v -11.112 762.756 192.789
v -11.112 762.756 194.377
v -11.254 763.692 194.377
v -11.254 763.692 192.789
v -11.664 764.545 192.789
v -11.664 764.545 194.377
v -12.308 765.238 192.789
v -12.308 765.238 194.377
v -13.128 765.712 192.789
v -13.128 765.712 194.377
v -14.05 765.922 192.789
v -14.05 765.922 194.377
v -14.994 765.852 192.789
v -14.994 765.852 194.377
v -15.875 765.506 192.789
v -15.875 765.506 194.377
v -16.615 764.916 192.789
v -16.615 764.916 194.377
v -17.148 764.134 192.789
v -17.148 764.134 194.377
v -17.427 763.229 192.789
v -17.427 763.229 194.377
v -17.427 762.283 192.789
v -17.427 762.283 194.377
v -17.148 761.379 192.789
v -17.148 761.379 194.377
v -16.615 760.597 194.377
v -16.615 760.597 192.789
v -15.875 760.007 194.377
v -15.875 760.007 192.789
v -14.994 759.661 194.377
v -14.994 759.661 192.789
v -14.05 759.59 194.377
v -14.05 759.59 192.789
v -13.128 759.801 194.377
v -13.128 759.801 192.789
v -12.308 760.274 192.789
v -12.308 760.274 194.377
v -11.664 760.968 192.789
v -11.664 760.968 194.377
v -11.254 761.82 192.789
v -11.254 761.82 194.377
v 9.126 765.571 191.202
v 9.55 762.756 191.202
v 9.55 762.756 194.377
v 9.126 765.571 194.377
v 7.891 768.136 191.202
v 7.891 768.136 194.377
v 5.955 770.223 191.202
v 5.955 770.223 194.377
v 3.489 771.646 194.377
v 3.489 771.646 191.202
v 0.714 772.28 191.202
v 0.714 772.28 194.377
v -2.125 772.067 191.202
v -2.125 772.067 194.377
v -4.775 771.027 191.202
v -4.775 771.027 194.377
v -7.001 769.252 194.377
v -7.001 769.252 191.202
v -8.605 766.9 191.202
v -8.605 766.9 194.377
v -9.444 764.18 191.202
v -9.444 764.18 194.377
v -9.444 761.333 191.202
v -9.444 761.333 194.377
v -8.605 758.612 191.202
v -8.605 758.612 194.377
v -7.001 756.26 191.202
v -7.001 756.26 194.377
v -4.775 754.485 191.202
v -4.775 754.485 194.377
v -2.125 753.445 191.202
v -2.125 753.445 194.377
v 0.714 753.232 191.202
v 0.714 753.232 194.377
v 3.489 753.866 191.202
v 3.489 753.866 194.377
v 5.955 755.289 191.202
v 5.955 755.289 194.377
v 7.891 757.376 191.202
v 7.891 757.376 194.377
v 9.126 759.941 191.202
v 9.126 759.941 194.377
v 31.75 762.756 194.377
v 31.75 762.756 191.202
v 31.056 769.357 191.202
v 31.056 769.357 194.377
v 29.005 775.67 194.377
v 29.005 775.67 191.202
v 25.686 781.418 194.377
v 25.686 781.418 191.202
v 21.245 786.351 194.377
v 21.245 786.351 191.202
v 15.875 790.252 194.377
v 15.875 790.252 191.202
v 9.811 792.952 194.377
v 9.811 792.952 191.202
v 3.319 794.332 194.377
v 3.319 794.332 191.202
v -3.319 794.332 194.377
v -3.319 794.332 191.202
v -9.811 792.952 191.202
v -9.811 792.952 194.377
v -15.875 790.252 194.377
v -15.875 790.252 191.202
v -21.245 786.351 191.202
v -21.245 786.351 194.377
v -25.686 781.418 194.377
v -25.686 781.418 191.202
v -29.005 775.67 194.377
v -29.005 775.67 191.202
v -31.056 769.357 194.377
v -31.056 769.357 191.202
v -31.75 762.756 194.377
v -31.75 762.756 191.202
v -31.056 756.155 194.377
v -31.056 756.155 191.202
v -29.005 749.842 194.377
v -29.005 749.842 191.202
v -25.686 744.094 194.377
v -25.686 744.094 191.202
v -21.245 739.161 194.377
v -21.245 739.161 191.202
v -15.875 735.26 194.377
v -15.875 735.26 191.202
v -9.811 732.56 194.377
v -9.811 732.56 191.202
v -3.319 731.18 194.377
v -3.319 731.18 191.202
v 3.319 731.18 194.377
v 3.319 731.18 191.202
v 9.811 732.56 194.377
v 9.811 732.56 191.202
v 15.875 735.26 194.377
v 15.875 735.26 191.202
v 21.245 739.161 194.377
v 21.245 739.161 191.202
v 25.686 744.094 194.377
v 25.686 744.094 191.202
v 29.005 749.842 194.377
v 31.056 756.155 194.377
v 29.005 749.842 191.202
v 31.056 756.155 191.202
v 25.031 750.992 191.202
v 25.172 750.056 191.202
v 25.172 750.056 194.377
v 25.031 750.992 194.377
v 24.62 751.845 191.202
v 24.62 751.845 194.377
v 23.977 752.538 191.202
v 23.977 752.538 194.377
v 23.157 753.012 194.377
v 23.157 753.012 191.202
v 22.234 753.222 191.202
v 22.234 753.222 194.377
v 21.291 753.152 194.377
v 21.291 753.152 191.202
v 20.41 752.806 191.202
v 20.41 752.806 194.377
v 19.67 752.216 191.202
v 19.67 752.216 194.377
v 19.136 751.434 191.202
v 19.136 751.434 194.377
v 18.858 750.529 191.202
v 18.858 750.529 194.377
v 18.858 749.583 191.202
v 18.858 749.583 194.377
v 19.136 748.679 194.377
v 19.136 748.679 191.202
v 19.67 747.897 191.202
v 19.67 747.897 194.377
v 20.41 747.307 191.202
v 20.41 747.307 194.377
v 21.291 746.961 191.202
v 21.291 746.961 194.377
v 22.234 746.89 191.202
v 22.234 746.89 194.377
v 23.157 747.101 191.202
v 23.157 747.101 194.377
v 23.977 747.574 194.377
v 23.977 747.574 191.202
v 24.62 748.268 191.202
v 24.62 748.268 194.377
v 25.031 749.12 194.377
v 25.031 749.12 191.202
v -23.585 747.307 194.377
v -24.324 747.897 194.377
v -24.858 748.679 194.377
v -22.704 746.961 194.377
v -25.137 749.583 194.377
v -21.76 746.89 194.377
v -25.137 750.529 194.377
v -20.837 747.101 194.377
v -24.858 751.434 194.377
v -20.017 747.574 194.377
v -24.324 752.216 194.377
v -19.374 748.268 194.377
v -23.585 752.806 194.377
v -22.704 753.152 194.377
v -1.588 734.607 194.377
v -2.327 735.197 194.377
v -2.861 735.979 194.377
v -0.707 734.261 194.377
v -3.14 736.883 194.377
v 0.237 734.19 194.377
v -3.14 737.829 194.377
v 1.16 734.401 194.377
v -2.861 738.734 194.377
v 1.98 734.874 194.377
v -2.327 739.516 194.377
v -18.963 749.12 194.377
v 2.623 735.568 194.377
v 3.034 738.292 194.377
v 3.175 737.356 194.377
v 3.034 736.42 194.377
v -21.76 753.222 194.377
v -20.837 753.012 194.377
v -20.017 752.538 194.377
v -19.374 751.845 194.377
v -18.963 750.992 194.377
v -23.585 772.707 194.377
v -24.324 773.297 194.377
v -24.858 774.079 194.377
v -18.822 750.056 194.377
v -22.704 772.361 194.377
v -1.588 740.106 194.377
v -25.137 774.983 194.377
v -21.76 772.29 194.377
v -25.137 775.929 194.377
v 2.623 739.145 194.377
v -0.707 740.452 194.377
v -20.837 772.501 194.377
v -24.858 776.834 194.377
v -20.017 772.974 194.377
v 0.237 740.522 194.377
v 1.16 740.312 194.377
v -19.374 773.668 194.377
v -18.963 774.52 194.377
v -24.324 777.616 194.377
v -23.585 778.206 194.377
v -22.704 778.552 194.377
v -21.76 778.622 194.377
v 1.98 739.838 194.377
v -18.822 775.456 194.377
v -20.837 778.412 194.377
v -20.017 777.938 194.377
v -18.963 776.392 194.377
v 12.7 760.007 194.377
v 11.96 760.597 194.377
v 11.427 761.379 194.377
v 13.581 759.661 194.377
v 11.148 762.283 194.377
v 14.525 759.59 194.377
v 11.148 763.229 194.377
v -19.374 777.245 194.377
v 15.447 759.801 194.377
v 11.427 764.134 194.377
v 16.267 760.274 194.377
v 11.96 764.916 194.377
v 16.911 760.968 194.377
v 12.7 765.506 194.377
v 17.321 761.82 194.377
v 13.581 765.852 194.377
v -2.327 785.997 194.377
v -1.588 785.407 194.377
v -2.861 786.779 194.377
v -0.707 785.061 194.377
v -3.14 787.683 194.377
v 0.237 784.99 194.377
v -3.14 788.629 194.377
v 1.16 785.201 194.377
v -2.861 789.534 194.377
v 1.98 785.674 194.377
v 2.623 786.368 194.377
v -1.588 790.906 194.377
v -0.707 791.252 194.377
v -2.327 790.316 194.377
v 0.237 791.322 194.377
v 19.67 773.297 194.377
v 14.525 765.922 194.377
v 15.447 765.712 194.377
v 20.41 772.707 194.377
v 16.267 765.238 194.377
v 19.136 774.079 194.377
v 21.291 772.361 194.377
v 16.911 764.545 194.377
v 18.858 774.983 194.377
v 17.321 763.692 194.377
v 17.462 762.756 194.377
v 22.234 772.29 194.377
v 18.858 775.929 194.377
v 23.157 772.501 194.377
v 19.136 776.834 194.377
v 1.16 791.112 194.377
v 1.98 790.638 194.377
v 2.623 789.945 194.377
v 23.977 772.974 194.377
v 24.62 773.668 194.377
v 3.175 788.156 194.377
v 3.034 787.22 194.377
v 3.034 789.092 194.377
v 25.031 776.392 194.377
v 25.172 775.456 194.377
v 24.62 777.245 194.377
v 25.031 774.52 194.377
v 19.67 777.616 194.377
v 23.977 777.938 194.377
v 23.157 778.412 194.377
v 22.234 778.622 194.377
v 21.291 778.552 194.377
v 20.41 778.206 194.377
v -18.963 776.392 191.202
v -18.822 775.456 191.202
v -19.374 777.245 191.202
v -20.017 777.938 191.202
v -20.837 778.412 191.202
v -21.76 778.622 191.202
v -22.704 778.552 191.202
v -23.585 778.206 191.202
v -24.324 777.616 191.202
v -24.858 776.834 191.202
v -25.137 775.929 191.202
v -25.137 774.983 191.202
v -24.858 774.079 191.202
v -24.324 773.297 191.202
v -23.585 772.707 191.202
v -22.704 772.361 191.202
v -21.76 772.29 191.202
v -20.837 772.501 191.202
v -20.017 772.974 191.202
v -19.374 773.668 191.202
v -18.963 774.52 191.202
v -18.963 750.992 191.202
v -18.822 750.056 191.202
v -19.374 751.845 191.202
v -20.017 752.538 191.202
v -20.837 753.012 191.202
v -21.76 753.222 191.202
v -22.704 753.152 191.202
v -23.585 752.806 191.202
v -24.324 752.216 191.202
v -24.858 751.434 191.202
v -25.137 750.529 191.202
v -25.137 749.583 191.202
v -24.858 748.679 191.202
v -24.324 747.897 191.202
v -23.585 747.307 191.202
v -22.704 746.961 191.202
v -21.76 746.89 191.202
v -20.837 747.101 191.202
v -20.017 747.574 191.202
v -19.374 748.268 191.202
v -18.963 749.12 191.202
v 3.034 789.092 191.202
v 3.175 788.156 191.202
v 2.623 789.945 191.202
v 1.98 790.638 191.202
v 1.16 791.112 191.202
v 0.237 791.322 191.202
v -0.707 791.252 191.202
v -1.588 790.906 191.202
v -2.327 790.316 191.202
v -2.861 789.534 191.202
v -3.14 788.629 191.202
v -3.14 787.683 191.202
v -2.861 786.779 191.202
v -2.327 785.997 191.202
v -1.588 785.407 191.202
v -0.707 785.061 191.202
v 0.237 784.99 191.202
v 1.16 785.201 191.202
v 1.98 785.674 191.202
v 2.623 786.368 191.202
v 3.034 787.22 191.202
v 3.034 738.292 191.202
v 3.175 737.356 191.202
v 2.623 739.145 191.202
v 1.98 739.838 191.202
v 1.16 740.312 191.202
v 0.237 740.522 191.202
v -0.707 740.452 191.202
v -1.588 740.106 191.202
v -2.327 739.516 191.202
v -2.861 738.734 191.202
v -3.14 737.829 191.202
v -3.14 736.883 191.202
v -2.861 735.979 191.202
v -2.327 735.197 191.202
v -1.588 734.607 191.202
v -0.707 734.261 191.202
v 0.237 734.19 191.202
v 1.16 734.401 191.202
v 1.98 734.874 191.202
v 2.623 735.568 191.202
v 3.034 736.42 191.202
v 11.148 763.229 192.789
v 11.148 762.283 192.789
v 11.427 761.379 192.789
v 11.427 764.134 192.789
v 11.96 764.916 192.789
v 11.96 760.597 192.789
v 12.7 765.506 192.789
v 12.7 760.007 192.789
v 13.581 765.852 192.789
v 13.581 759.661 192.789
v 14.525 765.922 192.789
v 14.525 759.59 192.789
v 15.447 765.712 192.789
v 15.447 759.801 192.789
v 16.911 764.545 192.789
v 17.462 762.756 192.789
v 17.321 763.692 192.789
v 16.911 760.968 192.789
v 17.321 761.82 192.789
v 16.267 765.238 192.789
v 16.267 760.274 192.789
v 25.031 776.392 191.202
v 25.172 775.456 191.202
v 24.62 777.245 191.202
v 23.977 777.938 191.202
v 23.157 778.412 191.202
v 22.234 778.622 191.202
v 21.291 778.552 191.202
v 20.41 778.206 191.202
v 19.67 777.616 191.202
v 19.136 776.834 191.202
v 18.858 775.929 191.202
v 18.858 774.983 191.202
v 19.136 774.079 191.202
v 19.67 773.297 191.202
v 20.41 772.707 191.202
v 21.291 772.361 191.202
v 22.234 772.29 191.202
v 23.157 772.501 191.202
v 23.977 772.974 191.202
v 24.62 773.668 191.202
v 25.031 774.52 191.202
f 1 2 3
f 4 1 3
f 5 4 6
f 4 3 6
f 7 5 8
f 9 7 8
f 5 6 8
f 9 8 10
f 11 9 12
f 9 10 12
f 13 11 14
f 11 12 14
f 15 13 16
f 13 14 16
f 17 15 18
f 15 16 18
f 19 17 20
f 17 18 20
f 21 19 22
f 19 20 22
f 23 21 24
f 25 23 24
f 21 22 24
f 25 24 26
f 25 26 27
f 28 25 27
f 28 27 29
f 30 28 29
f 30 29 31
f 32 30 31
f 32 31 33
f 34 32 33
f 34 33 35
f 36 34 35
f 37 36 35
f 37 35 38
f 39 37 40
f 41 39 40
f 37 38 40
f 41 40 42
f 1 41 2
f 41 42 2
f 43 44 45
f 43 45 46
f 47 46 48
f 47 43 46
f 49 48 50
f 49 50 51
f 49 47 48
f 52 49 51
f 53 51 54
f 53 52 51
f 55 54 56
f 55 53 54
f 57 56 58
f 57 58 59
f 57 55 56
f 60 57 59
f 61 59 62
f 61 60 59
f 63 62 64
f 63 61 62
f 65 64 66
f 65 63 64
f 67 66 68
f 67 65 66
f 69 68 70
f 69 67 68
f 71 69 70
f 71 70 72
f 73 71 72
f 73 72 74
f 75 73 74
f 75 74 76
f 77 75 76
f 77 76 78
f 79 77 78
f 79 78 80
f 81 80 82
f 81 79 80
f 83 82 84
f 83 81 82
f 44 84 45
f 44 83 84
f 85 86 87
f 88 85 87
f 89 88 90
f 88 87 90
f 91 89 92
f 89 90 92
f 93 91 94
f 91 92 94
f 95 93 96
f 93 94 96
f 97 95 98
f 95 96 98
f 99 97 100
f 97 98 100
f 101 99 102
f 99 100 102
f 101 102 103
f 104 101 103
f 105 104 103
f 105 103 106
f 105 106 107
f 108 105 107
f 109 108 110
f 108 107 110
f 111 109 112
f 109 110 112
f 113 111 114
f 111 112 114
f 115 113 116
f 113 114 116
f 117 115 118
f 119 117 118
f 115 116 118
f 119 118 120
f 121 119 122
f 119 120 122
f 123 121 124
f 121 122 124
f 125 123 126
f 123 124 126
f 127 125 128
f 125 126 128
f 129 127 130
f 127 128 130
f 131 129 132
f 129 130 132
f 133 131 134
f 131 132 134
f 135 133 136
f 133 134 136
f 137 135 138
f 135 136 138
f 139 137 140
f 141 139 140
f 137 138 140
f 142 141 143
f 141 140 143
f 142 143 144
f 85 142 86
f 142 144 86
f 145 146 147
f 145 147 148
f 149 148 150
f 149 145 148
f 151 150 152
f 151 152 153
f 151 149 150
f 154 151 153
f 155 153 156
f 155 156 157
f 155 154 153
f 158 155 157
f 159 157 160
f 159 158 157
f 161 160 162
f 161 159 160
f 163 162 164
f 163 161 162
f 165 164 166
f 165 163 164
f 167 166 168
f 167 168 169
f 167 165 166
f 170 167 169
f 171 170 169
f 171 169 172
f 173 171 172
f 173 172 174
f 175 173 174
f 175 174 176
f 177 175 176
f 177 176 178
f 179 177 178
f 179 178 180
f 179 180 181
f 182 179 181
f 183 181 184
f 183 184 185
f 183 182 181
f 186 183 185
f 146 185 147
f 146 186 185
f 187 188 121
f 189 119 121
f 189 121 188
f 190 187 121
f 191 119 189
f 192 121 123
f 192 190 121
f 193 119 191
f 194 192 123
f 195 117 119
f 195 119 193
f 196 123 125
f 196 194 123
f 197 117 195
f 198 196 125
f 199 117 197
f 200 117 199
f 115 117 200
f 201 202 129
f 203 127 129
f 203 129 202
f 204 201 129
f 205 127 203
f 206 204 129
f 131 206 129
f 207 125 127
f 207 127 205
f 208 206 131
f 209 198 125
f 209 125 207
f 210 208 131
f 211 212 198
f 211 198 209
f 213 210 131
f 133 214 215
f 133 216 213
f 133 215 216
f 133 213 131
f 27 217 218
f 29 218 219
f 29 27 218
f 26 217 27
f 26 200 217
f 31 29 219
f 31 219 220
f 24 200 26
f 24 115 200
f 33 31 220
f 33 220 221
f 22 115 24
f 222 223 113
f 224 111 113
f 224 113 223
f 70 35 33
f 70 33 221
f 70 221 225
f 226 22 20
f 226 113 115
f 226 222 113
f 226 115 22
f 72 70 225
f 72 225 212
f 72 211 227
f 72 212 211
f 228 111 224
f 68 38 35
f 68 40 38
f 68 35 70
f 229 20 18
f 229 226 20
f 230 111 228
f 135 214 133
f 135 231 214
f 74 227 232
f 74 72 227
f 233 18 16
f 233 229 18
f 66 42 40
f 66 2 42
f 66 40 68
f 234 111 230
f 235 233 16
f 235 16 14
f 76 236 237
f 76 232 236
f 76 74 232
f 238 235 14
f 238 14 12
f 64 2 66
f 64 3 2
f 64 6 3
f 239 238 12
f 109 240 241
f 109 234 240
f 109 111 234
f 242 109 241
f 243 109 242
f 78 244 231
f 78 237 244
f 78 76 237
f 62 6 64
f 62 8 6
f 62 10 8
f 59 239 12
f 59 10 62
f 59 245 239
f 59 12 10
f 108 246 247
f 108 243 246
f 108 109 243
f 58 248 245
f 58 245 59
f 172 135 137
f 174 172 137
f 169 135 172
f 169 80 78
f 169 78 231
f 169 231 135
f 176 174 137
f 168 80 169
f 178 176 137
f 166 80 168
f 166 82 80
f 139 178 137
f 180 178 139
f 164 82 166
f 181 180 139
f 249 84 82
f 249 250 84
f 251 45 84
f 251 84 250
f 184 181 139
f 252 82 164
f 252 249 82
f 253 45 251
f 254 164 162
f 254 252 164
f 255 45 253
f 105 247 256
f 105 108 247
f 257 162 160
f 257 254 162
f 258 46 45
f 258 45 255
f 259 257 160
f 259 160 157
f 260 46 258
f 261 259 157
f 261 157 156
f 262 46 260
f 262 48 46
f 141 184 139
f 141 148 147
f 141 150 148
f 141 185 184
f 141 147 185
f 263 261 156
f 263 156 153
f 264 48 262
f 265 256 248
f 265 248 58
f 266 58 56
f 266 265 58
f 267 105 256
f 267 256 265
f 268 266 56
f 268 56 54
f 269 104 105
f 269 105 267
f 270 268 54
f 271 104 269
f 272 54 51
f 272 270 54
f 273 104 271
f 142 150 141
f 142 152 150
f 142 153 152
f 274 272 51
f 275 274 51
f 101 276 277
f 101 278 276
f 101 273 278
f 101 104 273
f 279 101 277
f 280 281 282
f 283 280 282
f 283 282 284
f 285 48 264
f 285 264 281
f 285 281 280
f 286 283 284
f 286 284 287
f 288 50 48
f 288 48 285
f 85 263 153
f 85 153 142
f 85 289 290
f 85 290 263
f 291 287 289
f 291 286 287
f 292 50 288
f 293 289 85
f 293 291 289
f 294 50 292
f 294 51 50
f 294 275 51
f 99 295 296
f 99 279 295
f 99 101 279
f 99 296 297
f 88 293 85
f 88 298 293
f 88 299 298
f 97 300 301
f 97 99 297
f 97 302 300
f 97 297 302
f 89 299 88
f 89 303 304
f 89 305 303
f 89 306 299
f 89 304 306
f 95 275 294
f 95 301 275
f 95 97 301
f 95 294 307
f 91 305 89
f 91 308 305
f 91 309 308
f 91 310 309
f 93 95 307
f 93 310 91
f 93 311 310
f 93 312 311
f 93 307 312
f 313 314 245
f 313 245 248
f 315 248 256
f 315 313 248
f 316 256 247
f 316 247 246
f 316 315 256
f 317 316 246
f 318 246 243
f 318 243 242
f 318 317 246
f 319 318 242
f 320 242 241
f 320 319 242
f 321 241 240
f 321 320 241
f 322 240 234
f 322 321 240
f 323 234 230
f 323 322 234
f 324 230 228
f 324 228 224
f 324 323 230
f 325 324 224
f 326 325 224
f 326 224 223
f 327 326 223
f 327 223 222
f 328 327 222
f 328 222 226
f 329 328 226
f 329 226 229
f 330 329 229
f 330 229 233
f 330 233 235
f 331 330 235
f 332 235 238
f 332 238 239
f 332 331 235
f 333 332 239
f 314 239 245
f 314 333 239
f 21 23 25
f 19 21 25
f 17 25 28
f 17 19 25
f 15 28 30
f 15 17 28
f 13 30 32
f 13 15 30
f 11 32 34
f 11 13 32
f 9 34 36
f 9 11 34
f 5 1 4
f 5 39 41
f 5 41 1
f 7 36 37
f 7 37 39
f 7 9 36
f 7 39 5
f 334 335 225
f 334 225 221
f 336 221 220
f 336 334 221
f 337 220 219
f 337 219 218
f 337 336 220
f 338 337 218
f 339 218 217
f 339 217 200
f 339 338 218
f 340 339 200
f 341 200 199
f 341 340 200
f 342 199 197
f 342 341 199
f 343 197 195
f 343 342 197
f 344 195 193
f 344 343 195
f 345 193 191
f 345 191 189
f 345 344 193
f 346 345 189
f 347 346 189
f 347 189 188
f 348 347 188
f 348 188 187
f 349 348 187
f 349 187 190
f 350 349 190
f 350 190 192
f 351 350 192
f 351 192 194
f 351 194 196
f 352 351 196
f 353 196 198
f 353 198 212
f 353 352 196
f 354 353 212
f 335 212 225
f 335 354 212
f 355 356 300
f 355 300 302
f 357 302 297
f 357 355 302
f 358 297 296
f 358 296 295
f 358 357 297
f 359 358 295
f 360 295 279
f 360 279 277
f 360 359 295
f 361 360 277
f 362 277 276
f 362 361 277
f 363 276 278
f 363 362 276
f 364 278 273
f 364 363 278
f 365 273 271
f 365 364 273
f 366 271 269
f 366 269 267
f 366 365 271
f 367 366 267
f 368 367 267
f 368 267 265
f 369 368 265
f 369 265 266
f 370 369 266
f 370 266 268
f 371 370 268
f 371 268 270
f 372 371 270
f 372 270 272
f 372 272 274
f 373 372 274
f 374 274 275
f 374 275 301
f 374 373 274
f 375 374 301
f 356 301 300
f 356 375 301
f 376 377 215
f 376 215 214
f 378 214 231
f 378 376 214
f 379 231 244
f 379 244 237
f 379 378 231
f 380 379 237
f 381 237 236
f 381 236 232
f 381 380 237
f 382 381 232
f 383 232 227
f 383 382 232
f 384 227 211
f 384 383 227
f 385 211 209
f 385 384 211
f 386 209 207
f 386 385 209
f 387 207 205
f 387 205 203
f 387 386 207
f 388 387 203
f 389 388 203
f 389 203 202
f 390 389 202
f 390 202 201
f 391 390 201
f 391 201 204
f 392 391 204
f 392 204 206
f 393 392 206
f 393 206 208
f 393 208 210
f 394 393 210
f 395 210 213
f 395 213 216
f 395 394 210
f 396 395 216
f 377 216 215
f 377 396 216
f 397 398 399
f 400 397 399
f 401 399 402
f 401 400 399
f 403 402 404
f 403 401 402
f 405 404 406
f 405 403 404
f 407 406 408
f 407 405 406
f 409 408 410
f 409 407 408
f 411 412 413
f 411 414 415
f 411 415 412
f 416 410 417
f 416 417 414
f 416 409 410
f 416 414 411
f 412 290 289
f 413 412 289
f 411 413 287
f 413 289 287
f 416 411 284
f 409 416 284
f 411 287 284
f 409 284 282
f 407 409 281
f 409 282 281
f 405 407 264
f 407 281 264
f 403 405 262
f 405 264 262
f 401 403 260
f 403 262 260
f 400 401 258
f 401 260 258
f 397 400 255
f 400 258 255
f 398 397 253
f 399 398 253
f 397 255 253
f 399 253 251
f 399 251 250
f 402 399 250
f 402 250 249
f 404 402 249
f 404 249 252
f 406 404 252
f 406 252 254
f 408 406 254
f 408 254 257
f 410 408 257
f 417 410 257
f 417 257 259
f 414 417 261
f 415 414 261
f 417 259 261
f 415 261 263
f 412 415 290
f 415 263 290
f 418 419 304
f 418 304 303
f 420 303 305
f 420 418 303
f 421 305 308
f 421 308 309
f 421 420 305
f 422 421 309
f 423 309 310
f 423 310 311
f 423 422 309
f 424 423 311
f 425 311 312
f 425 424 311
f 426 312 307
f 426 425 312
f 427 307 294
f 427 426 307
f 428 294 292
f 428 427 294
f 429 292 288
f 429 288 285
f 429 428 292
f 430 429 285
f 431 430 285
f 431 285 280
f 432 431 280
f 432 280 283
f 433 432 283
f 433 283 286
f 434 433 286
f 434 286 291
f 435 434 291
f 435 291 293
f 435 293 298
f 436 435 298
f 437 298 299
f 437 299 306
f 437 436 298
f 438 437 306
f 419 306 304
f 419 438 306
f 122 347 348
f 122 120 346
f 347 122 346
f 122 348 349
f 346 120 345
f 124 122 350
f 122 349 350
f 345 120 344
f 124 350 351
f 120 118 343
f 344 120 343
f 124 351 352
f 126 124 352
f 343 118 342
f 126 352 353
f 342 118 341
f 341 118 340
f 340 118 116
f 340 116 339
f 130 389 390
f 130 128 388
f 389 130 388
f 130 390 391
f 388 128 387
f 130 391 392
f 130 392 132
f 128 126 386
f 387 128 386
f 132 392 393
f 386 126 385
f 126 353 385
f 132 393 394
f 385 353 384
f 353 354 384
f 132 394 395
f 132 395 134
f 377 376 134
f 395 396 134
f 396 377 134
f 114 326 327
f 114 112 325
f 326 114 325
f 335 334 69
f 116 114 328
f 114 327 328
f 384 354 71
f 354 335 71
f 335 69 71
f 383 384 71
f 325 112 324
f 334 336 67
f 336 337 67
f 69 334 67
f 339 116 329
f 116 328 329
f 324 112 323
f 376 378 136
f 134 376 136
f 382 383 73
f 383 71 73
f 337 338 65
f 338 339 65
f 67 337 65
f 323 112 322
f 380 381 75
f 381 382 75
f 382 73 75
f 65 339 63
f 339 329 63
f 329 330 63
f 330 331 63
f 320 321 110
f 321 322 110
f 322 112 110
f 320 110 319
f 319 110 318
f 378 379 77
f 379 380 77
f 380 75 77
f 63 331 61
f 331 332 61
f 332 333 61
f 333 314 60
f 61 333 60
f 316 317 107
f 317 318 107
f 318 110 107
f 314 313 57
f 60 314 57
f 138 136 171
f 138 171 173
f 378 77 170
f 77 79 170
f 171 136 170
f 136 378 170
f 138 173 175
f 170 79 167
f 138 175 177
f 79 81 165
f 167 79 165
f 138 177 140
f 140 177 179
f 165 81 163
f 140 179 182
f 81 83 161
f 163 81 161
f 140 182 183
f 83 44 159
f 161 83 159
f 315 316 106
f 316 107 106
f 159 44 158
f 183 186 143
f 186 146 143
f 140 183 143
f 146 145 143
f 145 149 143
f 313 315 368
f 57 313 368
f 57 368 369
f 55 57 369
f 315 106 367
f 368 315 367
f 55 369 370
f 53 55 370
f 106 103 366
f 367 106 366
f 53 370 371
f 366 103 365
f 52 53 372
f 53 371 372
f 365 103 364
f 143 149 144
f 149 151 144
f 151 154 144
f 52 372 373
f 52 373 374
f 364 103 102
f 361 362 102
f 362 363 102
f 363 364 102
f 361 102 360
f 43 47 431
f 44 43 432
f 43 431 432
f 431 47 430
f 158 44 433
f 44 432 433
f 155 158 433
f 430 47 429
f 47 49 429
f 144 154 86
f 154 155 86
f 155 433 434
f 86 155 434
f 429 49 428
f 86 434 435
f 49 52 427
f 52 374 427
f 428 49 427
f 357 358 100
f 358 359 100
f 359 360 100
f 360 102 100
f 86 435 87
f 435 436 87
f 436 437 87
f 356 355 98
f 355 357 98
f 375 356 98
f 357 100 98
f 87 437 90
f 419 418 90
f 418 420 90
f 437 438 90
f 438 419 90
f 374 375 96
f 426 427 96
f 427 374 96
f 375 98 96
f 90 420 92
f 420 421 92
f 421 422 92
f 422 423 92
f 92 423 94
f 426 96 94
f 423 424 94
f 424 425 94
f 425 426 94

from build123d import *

# Parameters (mm, degrees)
SKETCH1_R           = 31.75
SKETCH1_R_2         = 3.175
SKETCH1_R_3         = 15.875
SKETCH1_R_4         = 9.5504
BOSS_EXTRUDE1_DEPTH = 3.175
SKETCH2_R           = 3.175
CUT_EXTRUDE1_DEPTH  = 1.5875


with BuildPart() as part:
    # Sketch1 → Boss-Extrude1 (new body)
    # profile 1 of 2: a face of its own
    with BuildSketch(Plane.XY.offset(191.201675)):
        with Locations((0, 762.756140976)):
            Circle(SKETCH1_R)
        with Locations((-21.997045256, 775.456140976)):
            Circle(SKETCH1_R_2, mode=Mode.SUBTRACT)
        with Locations((-21.997045256, 750.056140976)):
            Circle(SKETCH1_R_2, mode=Mode.SUBTRACT)
        with Locations((0, 737.356140976)):
            Circle(SKETCH1_R_2, mode=Mode.SUBTRACT)
        with Locations((21.997045256, 750.056140976)):
            Circle(SKETCH1_R_2, mode=Mode.SUBTRACT)
        with Locations((21.997045256, 775.456140976)):
            Circle(SKETCH1_R_2, mode=Mode.SUBTRACT)
        with Locations((0, 788.156140976)):
            Circle(SKETCH1_R_2, mode=Mode.SUBTRACT)
        with Locations((0, 762.756140976)):
            Circle(SKETCH1_R_3, mode=Mode.SUBTRACT)
    # profile 2 of 2: a face of its own
    with BuildSketch(Plane.XY.offset(191.201675)):
        with Locations((0, 762.756140976)):
            Circle(SKETCH1_R_3)
        with Locations((0, 762.756140976)):
            Circle(SKETCH1_R_4, mode=Mode.SUBTRACT)
    extrude(amount=BOSS_EXTRUDE1_DEPTH)

    # Sketch2 → Cut-Extrude1 (cut)
    with BuildSketch(Plane.XY.offset(194.376675)):
        with Locations((-14.2875, 762.756140976)):
            Circle(SKETCH2_R)
        with Locations((14.2875, 762.756140976)):
            Circle(SKETCH2_R)
    extrude(amount=-CUT_EXTRUDE1_DEPTH, mode=Mode.SUBTRACT)


solid = part.part
